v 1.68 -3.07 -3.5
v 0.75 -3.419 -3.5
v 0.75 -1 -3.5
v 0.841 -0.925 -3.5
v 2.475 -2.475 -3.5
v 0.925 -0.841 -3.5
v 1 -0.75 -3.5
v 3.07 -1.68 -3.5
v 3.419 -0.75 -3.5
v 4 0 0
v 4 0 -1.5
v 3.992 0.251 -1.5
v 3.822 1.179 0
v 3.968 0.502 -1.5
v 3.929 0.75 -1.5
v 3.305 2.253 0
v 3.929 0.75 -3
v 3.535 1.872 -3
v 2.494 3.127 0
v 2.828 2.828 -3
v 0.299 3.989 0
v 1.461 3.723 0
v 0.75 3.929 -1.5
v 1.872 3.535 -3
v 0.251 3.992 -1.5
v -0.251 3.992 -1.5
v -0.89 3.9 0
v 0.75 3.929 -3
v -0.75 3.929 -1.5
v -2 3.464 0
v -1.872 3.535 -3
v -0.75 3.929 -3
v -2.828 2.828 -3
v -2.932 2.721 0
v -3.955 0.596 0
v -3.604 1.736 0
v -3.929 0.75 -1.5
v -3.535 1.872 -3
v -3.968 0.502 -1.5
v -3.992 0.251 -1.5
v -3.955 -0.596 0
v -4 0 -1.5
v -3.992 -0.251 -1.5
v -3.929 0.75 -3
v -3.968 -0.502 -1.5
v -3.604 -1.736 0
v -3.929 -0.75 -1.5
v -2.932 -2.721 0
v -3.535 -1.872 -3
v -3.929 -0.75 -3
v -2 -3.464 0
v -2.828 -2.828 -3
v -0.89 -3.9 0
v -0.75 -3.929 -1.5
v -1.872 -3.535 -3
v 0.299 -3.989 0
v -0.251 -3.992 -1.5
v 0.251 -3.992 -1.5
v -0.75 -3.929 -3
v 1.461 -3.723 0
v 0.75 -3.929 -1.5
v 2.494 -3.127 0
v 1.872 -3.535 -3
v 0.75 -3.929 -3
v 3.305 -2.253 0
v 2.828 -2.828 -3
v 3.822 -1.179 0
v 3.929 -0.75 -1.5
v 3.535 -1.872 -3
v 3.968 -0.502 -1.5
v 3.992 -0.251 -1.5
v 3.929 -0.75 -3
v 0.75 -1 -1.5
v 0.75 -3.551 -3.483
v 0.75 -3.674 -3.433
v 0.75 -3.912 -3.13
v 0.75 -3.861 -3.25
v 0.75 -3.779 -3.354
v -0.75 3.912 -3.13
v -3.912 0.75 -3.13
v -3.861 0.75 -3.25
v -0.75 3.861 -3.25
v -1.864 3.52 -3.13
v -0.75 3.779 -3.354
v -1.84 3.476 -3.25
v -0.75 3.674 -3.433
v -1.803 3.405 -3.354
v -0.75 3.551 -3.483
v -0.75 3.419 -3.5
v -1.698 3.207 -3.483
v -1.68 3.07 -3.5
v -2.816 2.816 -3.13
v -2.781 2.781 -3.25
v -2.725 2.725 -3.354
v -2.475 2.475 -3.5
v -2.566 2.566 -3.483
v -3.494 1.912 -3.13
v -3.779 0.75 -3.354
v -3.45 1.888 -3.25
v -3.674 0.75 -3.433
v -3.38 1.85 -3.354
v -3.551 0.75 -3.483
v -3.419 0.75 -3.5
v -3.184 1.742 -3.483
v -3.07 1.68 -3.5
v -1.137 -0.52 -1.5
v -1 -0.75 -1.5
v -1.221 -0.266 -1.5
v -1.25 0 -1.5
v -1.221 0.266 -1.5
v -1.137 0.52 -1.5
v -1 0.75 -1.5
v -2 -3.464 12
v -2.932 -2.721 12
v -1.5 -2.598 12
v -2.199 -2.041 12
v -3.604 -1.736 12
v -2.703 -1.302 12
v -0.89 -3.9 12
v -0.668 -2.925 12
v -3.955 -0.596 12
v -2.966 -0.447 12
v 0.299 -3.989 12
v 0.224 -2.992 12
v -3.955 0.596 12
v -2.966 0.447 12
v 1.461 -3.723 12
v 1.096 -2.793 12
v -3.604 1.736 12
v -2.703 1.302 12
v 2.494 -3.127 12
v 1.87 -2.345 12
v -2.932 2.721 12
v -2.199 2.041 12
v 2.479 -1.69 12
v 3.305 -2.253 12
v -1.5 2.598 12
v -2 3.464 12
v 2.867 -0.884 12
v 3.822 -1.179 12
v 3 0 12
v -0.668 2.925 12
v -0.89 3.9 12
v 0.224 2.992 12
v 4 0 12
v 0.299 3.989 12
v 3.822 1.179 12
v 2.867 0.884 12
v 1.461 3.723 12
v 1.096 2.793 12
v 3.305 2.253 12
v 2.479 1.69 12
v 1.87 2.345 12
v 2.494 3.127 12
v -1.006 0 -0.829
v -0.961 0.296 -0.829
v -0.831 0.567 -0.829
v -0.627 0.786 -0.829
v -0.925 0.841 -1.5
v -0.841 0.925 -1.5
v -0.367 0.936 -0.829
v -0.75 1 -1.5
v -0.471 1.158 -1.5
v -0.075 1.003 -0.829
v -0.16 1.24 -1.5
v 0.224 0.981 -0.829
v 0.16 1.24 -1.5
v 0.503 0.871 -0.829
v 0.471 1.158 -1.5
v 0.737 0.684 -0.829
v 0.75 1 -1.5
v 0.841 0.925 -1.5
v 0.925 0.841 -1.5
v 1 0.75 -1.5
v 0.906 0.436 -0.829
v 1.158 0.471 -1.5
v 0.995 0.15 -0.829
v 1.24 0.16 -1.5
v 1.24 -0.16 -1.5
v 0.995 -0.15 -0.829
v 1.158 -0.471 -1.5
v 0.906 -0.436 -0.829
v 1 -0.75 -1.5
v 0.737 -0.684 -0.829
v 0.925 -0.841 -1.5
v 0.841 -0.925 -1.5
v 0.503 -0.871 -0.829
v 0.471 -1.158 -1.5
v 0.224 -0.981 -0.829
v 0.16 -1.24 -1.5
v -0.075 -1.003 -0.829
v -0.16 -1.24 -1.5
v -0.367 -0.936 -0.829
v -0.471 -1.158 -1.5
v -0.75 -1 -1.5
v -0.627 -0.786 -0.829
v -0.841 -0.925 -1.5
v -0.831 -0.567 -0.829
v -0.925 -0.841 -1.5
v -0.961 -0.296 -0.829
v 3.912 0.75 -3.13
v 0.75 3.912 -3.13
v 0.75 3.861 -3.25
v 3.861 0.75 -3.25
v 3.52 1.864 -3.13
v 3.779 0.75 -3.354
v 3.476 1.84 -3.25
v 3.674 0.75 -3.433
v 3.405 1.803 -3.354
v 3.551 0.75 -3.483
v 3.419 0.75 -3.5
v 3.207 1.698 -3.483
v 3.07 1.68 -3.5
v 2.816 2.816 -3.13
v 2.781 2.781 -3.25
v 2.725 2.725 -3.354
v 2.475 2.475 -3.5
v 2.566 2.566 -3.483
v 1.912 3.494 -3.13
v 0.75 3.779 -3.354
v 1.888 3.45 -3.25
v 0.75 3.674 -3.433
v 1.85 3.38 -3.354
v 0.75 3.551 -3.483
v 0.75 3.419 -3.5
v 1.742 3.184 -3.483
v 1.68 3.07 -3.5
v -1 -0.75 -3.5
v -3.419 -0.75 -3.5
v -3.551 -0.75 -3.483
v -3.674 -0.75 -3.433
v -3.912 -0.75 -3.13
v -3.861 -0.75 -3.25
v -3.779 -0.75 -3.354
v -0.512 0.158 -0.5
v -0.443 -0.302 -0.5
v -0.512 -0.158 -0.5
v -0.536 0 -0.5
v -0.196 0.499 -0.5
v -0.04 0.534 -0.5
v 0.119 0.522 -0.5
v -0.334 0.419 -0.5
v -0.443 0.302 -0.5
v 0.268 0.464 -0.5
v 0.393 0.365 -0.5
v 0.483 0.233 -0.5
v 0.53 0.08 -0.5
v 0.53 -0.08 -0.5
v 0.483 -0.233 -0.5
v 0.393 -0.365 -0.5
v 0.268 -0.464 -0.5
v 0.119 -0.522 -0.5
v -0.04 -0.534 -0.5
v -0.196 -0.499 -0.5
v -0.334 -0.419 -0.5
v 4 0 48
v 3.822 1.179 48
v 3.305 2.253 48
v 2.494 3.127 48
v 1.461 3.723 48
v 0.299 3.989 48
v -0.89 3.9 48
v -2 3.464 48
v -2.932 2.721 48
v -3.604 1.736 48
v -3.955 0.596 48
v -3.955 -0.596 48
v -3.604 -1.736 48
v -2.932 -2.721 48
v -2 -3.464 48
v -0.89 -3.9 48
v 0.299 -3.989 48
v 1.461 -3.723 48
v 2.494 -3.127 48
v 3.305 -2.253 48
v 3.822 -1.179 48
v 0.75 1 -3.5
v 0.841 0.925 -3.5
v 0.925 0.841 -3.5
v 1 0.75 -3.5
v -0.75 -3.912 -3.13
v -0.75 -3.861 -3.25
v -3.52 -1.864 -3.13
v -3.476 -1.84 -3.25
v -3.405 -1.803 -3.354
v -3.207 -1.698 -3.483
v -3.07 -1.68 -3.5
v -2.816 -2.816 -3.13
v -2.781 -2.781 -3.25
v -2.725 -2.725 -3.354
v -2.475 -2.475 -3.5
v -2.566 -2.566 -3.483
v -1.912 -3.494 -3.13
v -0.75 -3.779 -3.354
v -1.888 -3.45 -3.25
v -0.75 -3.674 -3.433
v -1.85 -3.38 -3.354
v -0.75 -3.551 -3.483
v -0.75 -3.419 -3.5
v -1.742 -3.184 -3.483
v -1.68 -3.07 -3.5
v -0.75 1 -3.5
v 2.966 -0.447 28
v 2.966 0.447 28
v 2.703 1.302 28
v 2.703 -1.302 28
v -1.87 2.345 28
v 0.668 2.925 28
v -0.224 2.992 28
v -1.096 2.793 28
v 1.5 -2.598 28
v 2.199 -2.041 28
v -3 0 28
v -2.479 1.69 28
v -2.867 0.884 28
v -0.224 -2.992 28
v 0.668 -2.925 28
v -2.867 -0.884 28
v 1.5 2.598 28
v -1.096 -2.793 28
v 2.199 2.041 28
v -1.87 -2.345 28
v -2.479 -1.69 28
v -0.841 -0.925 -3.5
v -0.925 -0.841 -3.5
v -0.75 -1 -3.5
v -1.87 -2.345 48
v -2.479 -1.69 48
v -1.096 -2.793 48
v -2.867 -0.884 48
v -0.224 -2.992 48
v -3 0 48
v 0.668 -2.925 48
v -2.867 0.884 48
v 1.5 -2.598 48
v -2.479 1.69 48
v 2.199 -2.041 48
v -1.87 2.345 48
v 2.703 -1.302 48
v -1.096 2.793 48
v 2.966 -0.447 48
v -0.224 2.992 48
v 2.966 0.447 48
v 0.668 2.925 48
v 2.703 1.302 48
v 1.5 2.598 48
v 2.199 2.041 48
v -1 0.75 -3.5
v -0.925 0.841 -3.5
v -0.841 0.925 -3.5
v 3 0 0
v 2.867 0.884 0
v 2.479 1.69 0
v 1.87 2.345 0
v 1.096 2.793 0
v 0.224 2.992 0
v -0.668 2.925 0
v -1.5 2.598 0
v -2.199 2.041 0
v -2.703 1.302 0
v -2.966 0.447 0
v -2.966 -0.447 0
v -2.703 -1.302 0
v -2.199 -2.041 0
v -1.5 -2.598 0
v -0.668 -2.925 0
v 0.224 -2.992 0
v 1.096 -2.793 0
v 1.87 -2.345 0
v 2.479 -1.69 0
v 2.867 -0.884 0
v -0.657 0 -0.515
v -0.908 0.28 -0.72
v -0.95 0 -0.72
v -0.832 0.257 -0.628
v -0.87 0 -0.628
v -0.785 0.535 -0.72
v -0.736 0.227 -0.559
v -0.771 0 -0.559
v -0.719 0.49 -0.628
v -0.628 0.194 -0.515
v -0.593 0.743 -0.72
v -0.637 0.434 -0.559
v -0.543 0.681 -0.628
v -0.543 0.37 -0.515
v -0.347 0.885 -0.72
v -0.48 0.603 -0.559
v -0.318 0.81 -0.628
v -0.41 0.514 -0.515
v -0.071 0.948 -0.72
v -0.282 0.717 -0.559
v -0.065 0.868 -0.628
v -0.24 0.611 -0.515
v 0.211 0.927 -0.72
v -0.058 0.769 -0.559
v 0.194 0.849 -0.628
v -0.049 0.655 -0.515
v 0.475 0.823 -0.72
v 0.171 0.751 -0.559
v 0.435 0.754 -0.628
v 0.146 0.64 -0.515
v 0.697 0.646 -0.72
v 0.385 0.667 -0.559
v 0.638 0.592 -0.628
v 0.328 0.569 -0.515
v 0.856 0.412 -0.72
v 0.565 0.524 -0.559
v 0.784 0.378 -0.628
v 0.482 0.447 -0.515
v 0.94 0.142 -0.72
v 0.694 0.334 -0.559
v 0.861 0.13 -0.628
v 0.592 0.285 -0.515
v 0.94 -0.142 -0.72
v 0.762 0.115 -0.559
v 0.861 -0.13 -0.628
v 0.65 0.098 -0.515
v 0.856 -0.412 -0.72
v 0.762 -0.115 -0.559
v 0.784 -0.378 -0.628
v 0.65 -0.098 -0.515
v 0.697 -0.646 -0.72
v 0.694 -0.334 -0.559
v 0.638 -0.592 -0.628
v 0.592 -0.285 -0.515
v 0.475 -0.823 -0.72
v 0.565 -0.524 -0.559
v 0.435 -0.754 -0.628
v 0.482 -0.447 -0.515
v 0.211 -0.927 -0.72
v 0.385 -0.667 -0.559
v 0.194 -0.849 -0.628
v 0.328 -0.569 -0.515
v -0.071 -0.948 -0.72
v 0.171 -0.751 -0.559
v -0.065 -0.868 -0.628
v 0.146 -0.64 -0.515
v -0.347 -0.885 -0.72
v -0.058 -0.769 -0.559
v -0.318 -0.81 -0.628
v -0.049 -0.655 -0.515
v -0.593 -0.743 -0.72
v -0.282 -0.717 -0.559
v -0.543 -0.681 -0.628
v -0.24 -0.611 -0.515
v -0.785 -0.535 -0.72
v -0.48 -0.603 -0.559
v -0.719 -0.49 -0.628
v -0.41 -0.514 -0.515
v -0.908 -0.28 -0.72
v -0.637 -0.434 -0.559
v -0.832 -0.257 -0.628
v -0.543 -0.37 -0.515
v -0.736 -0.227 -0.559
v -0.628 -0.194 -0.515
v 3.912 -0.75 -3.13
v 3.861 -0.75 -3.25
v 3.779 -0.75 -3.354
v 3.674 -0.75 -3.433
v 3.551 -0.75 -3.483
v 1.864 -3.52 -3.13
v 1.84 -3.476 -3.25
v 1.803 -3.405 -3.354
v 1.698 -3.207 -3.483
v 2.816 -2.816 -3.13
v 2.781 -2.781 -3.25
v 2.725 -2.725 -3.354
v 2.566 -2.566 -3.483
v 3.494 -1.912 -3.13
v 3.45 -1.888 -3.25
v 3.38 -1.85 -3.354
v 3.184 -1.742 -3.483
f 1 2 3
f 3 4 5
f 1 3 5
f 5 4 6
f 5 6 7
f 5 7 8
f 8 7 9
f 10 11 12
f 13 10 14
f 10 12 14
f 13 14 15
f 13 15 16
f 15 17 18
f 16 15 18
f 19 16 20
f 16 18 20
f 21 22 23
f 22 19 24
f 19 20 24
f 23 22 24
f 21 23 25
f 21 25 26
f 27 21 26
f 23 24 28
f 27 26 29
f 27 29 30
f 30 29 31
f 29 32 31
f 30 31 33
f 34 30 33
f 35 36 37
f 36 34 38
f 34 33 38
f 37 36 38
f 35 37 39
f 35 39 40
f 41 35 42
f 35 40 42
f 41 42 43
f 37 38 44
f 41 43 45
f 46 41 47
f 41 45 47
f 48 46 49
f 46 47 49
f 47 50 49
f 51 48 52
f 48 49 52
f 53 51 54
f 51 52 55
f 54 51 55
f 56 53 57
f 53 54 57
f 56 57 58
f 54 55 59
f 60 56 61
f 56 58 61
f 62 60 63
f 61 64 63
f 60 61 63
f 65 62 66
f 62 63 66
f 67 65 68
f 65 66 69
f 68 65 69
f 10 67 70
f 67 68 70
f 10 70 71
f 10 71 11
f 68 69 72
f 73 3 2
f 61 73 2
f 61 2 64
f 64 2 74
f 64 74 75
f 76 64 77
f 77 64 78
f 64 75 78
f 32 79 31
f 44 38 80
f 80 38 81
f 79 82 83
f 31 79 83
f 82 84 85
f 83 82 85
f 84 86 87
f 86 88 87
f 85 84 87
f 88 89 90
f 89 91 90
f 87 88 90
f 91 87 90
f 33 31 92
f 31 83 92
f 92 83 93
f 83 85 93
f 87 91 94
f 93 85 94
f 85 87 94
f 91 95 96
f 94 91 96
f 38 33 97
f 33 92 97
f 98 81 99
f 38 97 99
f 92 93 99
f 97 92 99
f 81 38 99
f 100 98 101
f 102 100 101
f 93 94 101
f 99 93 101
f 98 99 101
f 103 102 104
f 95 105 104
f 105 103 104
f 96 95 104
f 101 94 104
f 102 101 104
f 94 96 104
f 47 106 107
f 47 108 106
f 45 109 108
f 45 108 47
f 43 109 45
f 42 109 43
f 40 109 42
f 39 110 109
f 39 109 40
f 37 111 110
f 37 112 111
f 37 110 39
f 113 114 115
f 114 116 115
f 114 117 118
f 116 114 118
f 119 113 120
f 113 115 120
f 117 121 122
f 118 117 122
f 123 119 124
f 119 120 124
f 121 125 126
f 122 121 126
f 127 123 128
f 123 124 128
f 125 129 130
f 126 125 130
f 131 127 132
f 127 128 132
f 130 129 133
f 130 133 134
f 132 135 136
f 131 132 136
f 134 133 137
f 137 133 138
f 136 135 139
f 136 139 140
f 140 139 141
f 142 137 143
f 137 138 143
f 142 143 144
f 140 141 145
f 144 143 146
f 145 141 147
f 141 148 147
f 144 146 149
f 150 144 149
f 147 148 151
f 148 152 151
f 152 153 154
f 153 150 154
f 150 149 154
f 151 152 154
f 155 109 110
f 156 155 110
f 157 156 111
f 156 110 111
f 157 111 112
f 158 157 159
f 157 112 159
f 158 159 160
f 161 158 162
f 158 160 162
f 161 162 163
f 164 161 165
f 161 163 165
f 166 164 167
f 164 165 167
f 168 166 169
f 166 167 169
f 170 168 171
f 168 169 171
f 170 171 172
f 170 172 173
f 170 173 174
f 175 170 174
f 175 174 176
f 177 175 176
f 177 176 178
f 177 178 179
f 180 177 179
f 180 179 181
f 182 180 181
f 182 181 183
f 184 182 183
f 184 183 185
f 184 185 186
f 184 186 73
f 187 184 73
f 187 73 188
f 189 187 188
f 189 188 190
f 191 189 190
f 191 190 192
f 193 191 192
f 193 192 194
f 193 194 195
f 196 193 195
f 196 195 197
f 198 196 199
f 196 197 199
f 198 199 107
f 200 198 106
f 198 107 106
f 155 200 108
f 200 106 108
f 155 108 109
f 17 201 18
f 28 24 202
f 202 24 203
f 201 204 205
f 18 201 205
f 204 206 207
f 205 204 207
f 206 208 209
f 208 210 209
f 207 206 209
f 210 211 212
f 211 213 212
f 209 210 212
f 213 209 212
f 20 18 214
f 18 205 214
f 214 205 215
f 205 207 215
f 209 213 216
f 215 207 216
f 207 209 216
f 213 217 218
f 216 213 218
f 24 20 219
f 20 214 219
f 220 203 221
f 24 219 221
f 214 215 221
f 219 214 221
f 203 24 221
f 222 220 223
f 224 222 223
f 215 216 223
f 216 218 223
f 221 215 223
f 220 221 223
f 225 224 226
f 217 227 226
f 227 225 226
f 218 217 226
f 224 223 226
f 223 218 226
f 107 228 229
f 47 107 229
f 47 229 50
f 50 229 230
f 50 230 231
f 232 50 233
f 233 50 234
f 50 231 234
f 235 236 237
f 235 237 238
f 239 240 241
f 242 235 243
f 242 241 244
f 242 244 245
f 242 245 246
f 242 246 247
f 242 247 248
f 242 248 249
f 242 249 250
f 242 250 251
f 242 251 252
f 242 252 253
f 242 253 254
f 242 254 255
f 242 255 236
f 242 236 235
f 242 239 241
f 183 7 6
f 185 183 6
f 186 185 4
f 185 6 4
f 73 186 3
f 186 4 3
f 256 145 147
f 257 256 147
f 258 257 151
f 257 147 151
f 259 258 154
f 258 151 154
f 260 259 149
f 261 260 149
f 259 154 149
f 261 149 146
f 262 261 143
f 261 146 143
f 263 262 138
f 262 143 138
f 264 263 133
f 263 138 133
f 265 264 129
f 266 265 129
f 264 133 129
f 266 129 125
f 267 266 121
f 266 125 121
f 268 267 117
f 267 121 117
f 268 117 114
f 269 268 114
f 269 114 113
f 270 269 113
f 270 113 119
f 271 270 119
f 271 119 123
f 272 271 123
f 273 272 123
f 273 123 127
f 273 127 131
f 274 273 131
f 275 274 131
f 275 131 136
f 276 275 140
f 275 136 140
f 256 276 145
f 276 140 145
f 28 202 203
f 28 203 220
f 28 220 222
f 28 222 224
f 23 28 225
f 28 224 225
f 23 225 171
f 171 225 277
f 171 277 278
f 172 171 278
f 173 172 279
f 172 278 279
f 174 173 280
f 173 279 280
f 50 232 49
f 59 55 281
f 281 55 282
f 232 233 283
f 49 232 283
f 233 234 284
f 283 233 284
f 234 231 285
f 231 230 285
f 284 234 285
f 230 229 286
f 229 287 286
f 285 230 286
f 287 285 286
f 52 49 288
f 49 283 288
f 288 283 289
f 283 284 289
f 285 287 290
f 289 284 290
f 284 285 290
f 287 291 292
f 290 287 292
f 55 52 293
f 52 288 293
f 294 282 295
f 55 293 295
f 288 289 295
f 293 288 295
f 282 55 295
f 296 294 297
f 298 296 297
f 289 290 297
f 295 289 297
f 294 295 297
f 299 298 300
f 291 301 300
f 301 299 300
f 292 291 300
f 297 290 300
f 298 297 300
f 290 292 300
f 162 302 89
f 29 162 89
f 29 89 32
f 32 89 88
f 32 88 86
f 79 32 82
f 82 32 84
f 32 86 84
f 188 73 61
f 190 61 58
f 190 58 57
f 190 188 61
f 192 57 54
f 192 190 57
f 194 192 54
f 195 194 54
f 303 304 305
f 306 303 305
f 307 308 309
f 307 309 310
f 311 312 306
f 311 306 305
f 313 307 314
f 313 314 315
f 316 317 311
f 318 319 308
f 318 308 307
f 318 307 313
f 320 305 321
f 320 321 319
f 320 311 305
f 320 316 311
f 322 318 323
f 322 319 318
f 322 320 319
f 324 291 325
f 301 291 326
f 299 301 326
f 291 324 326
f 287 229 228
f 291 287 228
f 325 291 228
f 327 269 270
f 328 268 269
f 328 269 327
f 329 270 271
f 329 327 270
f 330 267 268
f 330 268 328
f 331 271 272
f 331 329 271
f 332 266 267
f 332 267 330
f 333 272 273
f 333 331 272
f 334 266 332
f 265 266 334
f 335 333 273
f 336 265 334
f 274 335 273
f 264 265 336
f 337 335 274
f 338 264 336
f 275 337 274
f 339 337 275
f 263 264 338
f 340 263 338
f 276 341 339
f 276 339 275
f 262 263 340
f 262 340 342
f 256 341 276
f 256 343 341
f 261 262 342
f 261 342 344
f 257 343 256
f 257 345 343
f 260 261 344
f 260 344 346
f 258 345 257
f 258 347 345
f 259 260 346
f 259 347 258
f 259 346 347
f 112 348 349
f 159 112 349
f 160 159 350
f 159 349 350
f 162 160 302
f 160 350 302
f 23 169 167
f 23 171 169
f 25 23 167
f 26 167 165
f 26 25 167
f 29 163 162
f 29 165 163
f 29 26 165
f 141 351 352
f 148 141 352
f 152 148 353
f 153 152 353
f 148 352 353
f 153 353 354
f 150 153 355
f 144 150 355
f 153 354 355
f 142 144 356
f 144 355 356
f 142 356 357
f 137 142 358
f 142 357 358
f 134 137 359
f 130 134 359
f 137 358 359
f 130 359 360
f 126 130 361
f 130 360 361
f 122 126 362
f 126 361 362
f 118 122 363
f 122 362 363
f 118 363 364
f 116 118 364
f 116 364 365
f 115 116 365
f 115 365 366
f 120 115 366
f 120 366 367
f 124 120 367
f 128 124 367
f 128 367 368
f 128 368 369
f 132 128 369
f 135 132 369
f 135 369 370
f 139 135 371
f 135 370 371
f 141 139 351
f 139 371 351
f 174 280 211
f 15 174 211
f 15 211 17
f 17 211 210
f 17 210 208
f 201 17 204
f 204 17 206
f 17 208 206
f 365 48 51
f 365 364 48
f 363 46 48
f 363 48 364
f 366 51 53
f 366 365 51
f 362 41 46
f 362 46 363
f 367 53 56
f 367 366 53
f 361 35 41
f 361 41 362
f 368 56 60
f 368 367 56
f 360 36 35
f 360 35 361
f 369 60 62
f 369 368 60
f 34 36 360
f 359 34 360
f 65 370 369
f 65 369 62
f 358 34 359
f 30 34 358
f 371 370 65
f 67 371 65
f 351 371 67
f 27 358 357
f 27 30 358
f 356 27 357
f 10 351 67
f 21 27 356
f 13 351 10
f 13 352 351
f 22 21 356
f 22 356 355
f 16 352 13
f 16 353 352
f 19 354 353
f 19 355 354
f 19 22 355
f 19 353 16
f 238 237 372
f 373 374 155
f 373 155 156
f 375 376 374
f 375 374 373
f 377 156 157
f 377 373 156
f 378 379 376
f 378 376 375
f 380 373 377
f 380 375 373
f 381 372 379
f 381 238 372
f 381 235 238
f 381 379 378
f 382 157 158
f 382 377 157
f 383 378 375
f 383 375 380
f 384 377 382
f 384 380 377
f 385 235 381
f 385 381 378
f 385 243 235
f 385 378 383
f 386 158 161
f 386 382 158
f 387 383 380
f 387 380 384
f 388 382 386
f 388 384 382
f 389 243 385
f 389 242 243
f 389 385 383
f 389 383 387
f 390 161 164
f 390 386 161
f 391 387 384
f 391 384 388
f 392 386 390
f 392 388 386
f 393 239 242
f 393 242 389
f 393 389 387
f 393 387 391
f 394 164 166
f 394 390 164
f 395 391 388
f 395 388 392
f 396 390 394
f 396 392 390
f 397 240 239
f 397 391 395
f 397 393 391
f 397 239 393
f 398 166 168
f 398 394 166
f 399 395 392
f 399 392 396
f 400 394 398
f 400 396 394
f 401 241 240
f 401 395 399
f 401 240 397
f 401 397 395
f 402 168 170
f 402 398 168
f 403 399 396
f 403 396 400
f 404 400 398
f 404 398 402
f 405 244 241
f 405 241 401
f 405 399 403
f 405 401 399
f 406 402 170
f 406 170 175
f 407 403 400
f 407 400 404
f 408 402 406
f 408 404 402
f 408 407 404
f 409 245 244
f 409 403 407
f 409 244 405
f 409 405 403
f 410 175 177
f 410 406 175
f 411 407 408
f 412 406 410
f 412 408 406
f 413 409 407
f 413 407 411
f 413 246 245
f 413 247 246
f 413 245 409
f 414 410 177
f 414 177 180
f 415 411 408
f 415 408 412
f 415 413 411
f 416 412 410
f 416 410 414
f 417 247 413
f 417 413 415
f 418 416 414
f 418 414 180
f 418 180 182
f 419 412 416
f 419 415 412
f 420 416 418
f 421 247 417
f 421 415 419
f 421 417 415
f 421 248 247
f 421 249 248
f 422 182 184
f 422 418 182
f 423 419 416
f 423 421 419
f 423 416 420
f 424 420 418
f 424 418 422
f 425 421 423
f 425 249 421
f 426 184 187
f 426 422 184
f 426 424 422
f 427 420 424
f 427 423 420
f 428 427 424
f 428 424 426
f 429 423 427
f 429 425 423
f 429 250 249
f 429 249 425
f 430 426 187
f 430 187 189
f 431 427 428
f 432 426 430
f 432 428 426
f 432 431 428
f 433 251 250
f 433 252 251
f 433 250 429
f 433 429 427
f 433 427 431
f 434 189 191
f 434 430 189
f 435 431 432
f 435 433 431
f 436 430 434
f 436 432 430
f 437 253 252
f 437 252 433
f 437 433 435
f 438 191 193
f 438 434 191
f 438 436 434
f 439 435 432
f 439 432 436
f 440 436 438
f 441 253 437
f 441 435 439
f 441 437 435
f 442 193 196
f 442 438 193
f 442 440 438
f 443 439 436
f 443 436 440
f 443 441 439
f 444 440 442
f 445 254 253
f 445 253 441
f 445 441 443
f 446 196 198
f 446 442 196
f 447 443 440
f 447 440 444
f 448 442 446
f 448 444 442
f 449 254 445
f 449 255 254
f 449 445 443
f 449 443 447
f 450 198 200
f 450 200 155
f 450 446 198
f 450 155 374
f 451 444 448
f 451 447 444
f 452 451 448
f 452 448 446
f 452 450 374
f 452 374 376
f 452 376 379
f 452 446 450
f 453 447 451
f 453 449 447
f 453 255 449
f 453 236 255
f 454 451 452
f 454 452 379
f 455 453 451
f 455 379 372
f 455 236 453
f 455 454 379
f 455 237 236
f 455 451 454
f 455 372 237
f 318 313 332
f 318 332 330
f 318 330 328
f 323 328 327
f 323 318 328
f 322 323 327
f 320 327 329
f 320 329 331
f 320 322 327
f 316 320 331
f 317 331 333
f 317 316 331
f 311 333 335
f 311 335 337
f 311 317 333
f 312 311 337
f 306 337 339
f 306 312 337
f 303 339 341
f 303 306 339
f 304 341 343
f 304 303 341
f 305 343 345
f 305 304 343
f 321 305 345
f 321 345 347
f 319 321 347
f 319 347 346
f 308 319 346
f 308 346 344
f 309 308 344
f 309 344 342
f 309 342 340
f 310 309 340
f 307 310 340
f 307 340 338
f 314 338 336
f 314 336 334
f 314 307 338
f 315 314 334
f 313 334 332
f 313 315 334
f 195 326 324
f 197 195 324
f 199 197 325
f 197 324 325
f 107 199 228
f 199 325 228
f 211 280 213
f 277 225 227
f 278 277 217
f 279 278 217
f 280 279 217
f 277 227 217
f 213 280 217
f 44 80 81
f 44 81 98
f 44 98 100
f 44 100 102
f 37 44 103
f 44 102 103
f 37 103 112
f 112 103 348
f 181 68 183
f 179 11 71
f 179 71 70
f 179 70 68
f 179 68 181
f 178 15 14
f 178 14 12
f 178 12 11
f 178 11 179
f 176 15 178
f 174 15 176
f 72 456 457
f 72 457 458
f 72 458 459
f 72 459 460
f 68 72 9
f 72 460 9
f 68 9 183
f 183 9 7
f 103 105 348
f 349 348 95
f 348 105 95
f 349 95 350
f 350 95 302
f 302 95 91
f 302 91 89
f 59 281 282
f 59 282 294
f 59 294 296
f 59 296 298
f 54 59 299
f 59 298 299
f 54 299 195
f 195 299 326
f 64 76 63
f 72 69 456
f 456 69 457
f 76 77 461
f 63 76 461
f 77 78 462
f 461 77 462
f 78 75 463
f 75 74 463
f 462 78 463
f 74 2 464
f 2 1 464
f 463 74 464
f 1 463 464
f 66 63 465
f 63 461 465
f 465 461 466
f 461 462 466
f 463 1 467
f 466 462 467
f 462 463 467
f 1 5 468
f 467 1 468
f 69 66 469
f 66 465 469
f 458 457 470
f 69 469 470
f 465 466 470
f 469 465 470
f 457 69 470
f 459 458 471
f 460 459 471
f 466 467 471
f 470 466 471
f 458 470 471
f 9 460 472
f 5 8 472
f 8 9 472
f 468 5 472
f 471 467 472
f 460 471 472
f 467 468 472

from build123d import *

# Parameters (mm, degrees)
SKETCH1_R           = 3
BOSS_EXTRUDE1_DEPTH = 12
BOSS_EXTRUDE2_START = -3.5
SKETCH1_4_R         = 4
SKETCH1_4_R_2       = 3
BOSS_EXTRUDE2_DEPTH = 3.5
CUT_EXTRUDE1_DEPTH  = 2
FILLET1_R           = 0.5
CUT_EXTRUDE2_START  = -2
SKETCH2_3_R         = 1.25
CUT_EXTRUDE2_DEPTH  = 1
CUT_EXTRUDE2_DRAFT  = -20
FILLET2_R           = 0.5
BOSS_EXTRUDE3_START = 12
SKETCH1_5_R         = 4
BOSS_EXTRUDE3_DEPTH = 36
CUT_EXTRUDE3_START  = -20
SKETCH9_R           = 3
CUT_EXTRUDE3_DEPTH  = 20


with BuildPart() as part:
    # Sketch1 → Boss-Extrude1 (new body)
    with BuildSketch(Plane.XY):
        Circle(SKETCH1_R)
    extrude(amount=BOSS_EXTRUDE1_DEPTH)

    # Sketch1<4> → Boss-Extrude2 (add)
    # profile 1 of 2: a face of its own
    with BuildSketch(Plane.XY.offset(BOSS_EXTRUDE2_START)):
        Circle(SKETCH1_4_R)
        Circle(SKETCH1_4_R_2, mode=Mode.SUBTRACT)
    # profile 2 of 2: a face of its own
    with BuildSketch(Plane.XY.offset(BOSS_EXTRUDE2_START)):
        Circle(SKETCH1_4_R_2)
    extrude(amount=BOSS_EXTRUDE2_DEPTH)

    # Sketch2 → Cut-Extrude1 (cut)
    with BuildSketch(Plane(origin=(0, 0, -3.5), x_dir=(-1, 0, 0), z_dir=(0, 0, -1))):
        with BuildLine():
            ThreePointArc((0.75, 3.929058411), (0, 4), (-0.75, 3.929058411))
            Line((-0.75, 3.929058411), (-0.75, 1))
            ThreePointArc((-0.75, 1), (0, 1.25), (0.75, 1))
            Line((0.75, 1), (0.75, 3.929058411))
        make_face()
        with BuildLine():
            Line((-1, 0.75), (-3.929058411, 0.75))
            ThreePointArc((-3.929058411, 0.75), (-4, 0), (-3.929058411, -0.75))
            Line((-3.929058411, -0.75), (-1, -0.75))
            ThreePointArc((-1, -0.75), (-1.25, 0), (-1, 0.75))
        make_face()
        with BuildLine():
            ThreePointArc((4, 0), (3.98222511, 0.376673834), (3.929058411, 0.75))
            Line((3.929058411, 0.75), (1, 0.75))
            ThreePointArc((1, 0.75), (1.185854123, 0.395284708), (1.25, 0))
            ThreePointArc((1.25, 0), (1.185854123, -0.395284708), (1, -0.75))
            Line((1, -0.75), (3.929058411, -0.75))
            ThreePointArc((3.929058411, -0.75), (3.98222511, -0.376673834), (4, 0))
        make_face()
        with BuildLine():
            Line((-0.75, -1), (-0.75, -3.929058411))
            ThreePointArc((-0.75, -3.929058411), (0, -4), (0.75, -3.929058411))
            Line((0.75, -3.929058411), (0.75, -1))
            ThreePointArc((0.75, -1), (0, -1.25), (-0.75, -1))
        make_face()
        with BuildLine():
            ThreePointArc((0.75, 1), (0, 1.25), (-0.75, 1))
            Line((-0.75, 1), (-0.75, 0.75))
            Line((-0.75, 0.75), (-1, 0.75))
            ThreePointArc((-1, 0.75), (-1.25, 0), (-1, -0.75))
            Line((-1, -0.75), (-0.75, -0.75))
            Line((-0.75, -0.75), (-0.75, -1))
            ThreePointArc((-0.75, -1), (0, -1.25), (0.75, -1))
            Line((0.75, -1), (0.75, -0.75))
            Line((0.75, -0.75), (1, -0.75))
            ThreePointArc((1, -0.75), (1.185854123, -0.395284708), (1.25, 0))
            ThreePointArc((1.25, 0), (1.185854123, 0.395284708), (1, 0.75))
            Line((1, 0.75), (0.75, 0.75))
            Line((0.75, 0.75), (0.75, 1))
        make_face()
        with BuildLine():
            Line((-0.75, 0.75), (-0.75, 1))
            ThreePointArc((-0.75, 1), (-0.883883476, 0.883883476), (-1, 0.75))
            Line((-1, 0.75), (-0.75, 0.75))
        make_face()
        with BuildLine():
            ThreePointArc((1, 0.75), (0.883883476, 0.883883476), (0.75, 1))
            Line((0.75, 1), (0.75, 0.75))
            Line((0.75, 0.75), (1, 0.75))
        make_face()
        with BuildLine():
            ThreePointArc((0.75, -1), (0.883883476, -0.883883476), (1, -0.75))
            Line((1, -0.75), (0.75, -0.75))
            Line((0.75, -0.75), (0.75, -1))
        make_face()
        with BuildLine():
            Line((-0.75, -0.75), (-1, -0.75))
            ThreePointArc((-1, -0.75), (-0.883883476, -0.883883476), (-0.75, -1))
            Line((-0.75, -1), (-0.75, -0.75))
        make_face()
    extrude(amount=-CUT_EXTRUDE1_DEPTH, mode=Mode.SUBTRACT)

    # Fillet1
    fillet1_edges = [part.edges().sort_by_distance(p)[0] for p in [
        (-2.828427125, 2.828427125, -3.5),
        (-2.828427125, -2.828427125, -3.5),
        (2.828427125, -2.828427125, -3.5),
        (2.828427125, 2.828427125, -3.5),
    ]]
    fillet(fillet1_edges, radius=FILLET1_R)


with BuildPart() as cut_extrude2_tool:
    # Sketch2<3> → Cut-Extrude2 (with draft: the straight prism first)
    with BuildSketch(Plane(origin=(0, 0, -3.5), x_dir=(-1, 0, 0), z_dir=(0, 0, -1)).offset(CUT_EXTRUDE2_START)):
        Circle(SKETCH2_3_R)
    extrude(amount=-CUT_EXTRUDE2_DEPTH)
    # Cut-Extrude2: the draft: its side faces are tilted about the plane it starts from
    cut_extrude2_sides = [cut_extrude2_tool.faces().sort_by_distance(p)[0] for p in [
        (1.25, 0, -1),
    ]]
    draft(cut_extrude2_sides, Plane(origin=(0, 0, -3.5), x_dir=(-1, 0, 0), z_dir=(0, 0, -1)).offset(CUT_EXTRUDE2_START), CUT_EXTRUDE2_DRAFT)


with BuildPart() as part_1:
    add(part.part)

    # Cut-Extrude2: cut by cut_extrude2_tool
    add(cut_extrude2_tool.part, mode=Mode.SUBTRACT)

    # Fillet2
    fillet2_edges = [part_1.edges().sort_by_distance(p)[0] for p in [
        (0.886029766, 0, -0.5),
    ]]
    fillet(fillet2_edges, radius=FILLET2_R)

    # Sketch1<5> → Boss-Extrude3 (add)
    with BuildSketch(Plane.XY.offset(BOSS_EXTRUDE3_START)):
        Circle(SKETCH1_5_R)
    extrude(amount=BOSS_EXTRUDE3_DEPTH)

    # Sketch9 → Cut-Extrude3 (cut)
    with BuildSketch(Plane.XY.offset(48).offset(CUT_EXTRUDE3_START)):
        with Locations(Location((0, 0, 0), (0, 0, 180))):
            Circle(SKETCH9_R)
    extrude(amount=CUT_EXTRUDE3_DEPTH, mode=Mode.SUBTRACT)


solid = part_1.part
